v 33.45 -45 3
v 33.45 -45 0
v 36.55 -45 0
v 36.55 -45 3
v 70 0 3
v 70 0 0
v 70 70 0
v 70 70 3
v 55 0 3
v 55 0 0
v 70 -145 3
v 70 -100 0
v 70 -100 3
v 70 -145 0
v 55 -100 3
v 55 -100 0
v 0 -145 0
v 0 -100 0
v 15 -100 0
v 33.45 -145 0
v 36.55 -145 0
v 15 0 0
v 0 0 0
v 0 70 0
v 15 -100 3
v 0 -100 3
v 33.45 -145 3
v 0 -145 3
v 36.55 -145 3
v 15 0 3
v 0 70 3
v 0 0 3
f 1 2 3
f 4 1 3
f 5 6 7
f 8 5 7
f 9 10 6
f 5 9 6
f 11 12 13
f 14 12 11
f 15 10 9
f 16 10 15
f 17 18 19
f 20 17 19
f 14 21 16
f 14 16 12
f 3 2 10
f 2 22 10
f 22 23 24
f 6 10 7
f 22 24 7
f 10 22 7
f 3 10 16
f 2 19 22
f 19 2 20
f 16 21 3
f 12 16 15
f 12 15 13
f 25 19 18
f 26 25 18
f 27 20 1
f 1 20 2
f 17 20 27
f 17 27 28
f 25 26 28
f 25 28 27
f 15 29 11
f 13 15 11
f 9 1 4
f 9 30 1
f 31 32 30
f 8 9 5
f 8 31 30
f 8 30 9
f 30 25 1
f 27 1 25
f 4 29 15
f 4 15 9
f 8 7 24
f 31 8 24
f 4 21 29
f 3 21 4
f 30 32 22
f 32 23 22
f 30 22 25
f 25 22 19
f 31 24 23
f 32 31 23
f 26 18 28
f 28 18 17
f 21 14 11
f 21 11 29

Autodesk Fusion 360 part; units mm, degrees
sketch "Sketch1" plane through (0, 0, 0) normal (0, 0, 1) x (1, 0, 0)
  line L0 (0, 0) -> (70, 0)
  line L1 (70, 0) -> (70, 70)
  line L2 (70, 70) -> (0, 70)
  line L3 (0, 70) -> (0, 0)
  line L4 (70, 0) -> (55, 0)
  line L5 (0, 0) -> (15, 0)
  line L6 (15, 0) -> (15, -100)
  line L7 (55, 0) -> (55, -100)
  line L8 (55, -100) -> (70, -100)
  line L9 (15, -100) -> (0, -100)
  line L10 (0, -100) -> (0, -145)
  line L11 (70, -100) -> (70, -145)
  line L12 (70, -145) -> (0, -145)
  line L13 (35, -145) -> (36.55, -145)
  line L14 (35, -145) -> (33.45, -145)
  line L15 (36.55, -145) -> (36.55, -45)
  line L16 (33.45, -145) -> (33.45, -45)
  line L17 (33.45, -45) -> (36.55, -45)
  dimension "d1" = 70
  dimension "d2" = 70
  dimension "d3" = 15
  dimension "d4" = 15
  dimension "d5" = 100
  dimension "d6" = 100
  dimension "d7" = 15
  dimension "d8" = 15
  dimension "d9" = 45
  dimension "d10" = 45
  dimension "d11" = 1.55
  dimension "d12" = 1.55
  dimension "d13" = 100
  dimension "d14" = 100
  dimension "d17" = 33.25
  dimension "d18" = 33.25
extrude "Extrude1" add sketch "Sketch1" along normal blind 3 contours L0 L1 L2 L3 L4 L5 | L0 L6 L7 L8 L9 L10 L11 L12 L15 L16 L17
